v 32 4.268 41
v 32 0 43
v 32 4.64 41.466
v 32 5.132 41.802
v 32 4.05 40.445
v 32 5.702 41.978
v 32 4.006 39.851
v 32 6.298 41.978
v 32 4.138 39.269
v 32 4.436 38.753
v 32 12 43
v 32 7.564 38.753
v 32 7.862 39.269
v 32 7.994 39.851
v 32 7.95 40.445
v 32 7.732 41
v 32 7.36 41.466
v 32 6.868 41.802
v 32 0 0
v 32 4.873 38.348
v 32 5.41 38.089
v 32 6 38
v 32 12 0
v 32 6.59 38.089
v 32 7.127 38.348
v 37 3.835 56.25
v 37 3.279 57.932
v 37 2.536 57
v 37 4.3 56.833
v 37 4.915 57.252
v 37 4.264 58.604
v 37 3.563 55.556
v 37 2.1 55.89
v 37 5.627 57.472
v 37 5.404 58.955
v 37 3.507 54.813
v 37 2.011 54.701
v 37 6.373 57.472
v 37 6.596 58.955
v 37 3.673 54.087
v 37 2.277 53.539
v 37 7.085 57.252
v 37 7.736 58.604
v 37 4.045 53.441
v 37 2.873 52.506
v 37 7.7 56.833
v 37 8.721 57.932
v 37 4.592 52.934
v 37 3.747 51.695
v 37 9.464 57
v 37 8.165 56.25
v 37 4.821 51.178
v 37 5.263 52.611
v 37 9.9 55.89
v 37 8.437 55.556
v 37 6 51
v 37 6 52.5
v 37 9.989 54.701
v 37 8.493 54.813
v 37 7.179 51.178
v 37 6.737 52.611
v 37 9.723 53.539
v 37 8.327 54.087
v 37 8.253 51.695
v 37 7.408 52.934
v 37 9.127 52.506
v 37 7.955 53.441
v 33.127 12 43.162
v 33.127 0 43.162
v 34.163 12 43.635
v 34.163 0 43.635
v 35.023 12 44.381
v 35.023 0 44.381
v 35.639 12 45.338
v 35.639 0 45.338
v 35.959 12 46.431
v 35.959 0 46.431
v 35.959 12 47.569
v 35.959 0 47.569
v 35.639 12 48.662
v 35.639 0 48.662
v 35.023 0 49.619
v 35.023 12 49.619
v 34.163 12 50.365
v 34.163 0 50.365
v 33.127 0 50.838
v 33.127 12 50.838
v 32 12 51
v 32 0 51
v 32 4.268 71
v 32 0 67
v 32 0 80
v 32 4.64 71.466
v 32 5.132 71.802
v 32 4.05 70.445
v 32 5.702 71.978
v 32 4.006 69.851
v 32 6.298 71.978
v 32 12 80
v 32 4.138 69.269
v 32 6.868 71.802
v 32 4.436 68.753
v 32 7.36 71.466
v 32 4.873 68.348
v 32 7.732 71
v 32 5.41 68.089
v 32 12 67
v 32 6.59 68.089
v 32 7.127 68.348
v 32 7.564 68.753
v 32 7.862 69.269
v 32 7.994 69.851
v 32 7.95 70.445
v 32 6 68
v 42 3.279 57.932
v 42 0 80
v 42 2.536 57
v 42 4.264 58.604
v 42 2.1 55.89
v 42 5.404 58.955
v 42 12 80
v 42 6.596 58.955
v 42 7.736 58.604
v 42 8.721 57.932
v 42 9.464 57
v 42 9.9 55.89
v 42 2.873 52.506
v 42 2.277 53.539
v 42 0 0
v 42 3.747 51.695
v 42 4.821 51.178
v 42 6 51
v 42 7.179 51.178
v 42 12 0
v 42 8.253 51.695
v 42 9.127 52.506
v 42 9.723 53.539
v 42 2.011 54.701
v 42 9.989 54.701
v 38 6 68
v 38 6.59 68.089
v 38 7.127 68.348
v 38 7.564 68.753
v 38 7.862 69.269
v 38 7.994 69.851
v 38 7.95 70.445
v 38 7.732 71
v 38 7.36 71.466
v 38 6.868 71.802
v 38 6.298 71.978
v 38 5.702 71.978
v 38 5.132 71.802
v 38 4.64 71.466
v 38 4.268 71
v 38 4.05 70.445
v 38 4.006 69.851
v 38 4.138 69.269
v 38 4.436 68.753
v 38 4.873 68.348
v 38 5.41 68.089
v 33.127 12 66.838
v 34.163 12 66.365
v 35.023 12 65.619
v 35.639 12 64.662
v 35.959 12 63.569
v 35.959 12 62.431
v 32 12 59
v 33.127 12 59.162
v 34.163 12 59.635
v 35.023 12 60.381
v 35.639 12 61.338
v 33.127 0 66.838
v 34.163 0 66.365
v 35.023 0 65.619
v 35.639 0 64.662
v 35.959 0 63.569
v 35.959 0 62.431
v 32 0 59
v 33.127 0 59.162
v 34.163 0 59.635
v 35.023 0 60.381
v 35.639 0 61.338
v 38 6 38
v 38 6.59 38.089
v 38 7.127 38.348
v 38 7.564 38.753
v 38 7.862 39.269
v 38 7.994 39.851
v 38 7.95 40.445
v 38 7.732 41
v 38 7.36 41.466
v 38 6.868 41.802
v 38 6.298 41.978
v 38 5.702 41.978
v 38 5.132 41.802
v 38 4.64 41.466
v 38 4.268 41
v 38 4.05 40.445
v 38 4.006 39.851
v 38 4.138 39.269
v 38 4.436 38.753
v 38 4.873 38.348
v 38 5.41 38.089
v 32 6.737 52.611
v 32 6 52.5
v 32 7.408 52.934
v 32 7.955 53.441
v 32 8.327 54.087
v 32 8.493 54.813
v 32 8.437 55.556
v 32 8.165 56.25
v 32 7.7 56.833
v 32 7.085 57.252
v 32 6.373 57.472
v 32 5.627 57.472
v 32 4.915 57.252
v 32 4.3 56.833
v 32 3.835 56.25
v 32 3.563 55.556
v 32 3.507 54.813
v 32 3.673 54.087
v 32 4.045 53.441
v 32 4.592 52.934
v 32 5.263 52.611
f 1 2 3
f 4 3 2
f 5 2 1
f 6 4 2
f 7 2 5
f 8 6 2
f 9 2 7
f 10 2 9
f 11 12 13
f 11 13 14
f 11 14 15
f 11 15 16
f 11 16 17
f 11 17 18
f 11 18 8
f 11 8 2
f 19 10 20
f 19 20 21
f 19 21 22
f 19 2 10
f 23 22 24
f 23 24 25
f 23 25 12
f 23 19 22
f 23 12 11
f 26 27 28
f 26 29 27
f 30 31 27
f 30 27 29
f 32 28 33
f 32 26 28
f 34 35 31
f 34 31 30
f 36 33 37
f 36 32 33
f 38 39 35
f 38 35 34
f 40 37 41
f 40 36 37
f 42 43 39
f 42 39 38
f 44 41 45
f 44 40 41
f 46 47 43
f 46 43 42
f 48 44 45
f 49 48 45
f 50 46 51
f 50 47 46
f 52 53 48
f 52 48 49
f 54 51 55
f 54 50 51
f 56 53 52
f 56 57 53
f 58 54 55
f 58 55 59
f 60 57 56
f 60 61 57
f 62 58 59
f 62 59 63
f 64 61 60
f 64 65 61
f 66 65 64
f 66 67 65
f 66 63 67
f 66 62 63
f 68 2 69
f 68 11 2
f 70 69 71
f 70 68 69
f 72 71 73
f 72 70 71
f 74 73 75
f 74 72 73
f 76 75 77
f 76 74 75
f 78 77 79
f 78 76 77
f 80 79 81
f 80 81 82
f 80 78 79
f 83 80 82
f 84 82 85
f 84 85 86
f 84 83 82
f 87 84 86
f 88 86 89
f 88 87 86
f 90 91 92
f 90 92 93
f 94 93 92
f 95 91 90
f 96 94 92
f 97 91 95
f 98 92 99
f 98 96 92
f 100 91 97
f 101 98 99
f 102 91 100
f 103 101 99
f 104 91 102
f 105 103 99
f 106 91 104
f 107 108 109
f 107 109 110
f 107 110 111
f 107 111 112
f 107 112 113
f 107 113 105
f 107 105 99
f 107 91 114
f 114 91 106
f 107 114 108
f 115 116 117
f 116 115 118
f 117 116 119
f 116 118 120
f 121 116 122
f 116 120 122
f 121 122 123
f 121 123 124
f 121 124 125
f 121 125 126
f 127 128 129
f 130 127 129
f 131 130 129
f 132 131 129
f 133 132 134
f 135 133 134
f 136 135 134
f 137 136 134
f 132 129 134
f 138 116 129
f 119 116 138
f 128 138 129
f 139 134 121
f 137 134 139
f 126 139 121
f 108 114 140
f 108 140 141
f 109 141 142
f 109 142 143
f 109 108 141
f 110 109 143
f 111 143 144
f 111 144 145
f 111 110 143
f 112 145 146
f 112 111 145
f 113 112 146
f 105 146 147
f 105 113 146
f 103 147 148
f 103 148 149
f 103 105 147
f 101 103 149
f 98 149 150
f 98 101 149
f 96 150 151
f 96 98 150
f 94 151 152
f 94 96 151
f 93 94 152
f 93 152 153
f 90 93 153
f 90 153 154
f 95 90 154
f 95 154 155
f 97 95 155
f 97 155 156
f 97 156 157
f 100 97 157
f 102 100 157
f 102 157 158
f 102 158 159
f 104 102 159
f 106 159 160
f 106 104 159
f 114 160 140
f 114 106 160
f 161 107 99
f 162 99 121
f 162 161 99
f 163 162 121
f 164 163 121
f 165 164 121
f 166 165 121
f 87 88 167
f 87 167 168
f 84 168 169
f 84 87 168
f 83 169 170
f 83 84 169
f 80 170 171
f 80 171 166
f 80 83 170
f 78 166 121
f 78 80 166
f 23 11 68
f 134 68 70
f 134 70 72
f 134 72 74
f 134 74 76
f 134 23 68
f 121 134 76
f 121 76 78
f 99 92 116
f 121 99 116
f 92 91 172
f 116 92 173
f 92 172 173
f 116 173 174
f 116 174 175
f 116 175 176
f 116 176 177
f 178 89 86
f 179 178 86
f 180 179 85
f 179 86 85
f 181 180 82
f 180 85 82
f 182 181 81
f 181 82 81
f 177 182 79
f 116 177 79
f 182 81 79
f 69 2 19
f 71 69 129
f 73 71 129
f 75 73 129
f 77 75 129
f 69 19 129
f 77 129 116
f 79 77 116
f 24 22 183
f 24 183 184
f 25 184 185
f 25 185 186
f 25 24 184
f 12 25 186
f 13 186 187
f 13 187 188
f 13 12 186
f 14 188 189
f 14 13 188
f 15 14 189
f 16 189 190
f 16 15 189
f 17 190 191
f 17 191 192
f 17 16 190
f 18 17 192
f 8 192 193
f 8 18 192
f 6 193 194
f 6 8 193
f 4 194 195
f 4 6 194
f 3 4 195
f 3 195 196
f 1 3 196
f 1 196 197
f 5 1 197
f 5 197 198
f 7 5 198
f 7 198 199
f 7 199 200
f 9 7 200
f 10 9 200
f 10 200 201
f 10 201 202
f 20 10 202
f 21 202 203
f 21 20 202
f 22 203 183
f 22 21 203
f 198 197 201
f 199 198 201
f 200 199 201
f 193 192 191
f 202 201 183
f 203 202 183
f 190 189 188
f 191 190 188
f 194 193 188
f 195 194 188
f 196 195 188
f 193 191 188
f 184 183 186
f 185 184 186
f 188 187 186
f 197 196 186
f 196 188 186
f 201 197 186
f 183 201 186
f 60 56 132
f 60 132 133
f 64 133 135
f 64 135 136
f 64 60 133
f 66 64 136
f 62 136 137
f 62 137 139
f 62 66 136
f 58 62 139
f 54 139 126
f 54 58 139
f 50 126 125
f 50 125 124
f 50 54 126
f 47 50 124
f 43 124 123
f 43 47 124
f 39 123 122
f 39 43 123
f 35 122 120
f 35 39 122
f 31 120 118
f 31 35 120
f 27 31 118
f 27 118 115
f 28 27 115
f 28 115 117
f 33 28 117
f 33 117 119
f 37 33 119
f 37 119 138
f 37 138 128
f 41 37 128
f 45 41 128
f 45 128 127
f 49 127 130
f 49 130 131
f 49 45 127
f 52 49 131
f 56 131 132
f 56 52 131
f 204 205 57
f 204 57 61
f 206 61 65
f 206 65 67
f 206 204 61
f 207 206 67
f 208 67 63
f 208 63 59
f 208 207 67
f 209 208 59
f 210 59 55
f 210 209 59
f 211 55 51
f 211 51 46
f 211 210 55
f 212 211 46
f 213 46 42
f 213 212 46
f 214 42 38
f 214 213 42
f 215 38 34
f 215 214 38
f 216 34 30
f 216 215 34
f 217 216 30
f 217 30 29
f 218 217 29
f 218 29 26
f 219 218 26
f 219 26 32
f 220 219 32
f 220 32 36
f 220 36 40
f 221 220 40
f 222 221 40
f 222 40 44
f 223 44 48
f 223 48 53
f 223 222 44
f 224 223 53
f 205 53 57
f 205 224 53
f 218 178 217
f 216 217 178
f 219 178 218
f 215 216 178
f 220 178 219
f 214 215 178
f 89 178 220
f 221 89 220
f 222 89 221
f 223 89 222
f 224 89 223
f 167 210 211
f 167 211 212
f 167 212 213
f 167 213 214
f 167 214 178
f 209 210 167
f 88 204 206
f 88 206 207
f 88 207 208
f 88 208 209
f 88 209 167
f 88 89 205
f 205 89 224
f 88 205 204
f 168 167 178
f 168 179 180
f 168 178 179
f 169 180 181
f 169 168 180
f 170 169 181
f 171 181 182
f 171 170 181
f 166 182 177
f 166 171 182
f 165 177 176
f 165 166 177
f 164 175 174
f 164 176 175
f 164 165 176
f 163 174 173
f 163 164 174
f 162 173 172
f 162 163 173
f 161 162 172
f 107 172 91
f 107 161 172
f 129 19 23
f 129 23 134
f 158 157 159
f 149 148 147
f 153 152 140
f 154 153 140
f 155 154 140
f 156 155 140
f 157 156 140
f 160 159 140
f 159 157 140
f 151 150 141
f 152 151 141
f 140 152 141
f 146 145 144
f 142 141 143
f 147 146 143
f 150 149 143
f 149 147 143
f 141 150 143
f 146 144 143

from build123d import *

# Parameters (mm, degrees)
CYLINDER010_R     = 4
CYLINDER010_DEPTH = 12
CYLINDER009_R     = 4
CYLINDER009_DEPTH = 12
CYLINDER006_R     = 4
CYLINDER006_DEPTH = 5
CYLINDER005_R     = 2.5
CYLINDER005_DEPTH = 5
CYLINDER003_R     = 2
CYLINDER003_DEPTH = 6
CYLINDER002_R     = 2
CYLINDER002_DEPTH = 6
BOX_W             = 10
BOX_H             = 12
BOX_DEPTH         = 80


with BuildPart() as cylinder010:
    # Cylinder010 → Cylinder010 (new body)
    with BuildSketch(Plane(origin=(10, 10, 63), x_dir=(1, 0, 0), z_dir=(0, -1, 0))):
        Circle(CYLINDER010_R)
    extrude(amount=CYLINDER010_DEPTH)


with BuildPart() as fusion005:
    # Cylinder009 → Cylinder009 (new body)
    with BuildSketch(Plane(origin=(10, 10, 47), x_dir=(1, 0, 0), z_dir=(0, -1, 0))):
        Circle(CYLINDER009_R)
    extrude(amount=CYLINDER009_DEPTH)

    # Fusion005: union Cylinder010
    add(cylinder010.part)


with BuildPart() as fusion005_1:
    # Fusion005 placement: moved
    add(fusion005.part.moved(Location((22, 2, 0))))


with BuildPart() as cylinder006:
    # Cylinder006 → Cylinder006 (new body)
    with BuildSketch(Plane(origin=(37, 5, 55), x_dir=(0, 0, -1), z_dir=(1, 0, 0))):
        Circle(CYLINDER006_R)
    extrude(amount=CYLINDER006_DEPTH)


with BuildPart() as fusion003:
    # Cylinder005 → Cylinder005 (new body)
    with BuildSketch(Plane(origin=(32, 5, 55), x_dir=(0, 0, -1), z_dir=(1, 0, 0))):
        Circle(CYLINDER005_R)
    extrude(amount=CYLINDER005_DEPTH)

    # Fusion003: union Cylinder006
    add(cylinder006.part)


with BuildPart() as fusion003_1:
    # Fusion003 placement: moved
    add(fusion003.part.moved(Location((0, 1, 0))))


with BuildPart() as cylinder003:
    # Cylinder003 → Cylinder003 (new body)
    with BuildSketch(Plane(origin=(10, 5, 40), x_dir=(0, 0, -1), z_dir=(1, 0, 0))):
        Circle(CYLINDER003_R)
    extrude(amount=CYLINDER003_DEPTH)


with BuildPart() as clipsnegative:
    # Cylinder002 → Cylinder002 (new body)
    with BuildSketch(Plane(origin=(10, 5, 70), x_dir=(0, 0, -1), z_dir=(1, 0, 0))):
        Circle(CYLINDER002_R)
    extrude(amount=CYLINDER002_DEPTH)

    # Fusion001: union Cylinder003
    add(cylinder003.part)


with BuildPart() as clipsnegative_1:
    # Fusion001 placement: moved
    add(clipsnegative.part.moved(Location((22, 1, 0))))


with BuildPart() as clampsideb:
    # Box → Box (new body)
    with BuildSketch(Plane(origin=(32, 0, 0), x_dir=(1, 0, 0), z_dir=(0, 0, 1))):
        with Locations((5, 6)):
            Rectangle(BOX_W, BOX_H)
    extrude(amount=BOX_DEPTH)

    # Cut: cut ClipsNegative
    add(clipsnegative_1.part, mode=Mode.SUBTRACT)

    # Cut002: cut Fusion003
    add(fusion003_1.part, mode=Mode.SUBTRACT)

    # Cut004: cut Fusion005
    add(fusion005_1.part, mode=Mode.SUBTRACT)


solid = clampsideb.part
